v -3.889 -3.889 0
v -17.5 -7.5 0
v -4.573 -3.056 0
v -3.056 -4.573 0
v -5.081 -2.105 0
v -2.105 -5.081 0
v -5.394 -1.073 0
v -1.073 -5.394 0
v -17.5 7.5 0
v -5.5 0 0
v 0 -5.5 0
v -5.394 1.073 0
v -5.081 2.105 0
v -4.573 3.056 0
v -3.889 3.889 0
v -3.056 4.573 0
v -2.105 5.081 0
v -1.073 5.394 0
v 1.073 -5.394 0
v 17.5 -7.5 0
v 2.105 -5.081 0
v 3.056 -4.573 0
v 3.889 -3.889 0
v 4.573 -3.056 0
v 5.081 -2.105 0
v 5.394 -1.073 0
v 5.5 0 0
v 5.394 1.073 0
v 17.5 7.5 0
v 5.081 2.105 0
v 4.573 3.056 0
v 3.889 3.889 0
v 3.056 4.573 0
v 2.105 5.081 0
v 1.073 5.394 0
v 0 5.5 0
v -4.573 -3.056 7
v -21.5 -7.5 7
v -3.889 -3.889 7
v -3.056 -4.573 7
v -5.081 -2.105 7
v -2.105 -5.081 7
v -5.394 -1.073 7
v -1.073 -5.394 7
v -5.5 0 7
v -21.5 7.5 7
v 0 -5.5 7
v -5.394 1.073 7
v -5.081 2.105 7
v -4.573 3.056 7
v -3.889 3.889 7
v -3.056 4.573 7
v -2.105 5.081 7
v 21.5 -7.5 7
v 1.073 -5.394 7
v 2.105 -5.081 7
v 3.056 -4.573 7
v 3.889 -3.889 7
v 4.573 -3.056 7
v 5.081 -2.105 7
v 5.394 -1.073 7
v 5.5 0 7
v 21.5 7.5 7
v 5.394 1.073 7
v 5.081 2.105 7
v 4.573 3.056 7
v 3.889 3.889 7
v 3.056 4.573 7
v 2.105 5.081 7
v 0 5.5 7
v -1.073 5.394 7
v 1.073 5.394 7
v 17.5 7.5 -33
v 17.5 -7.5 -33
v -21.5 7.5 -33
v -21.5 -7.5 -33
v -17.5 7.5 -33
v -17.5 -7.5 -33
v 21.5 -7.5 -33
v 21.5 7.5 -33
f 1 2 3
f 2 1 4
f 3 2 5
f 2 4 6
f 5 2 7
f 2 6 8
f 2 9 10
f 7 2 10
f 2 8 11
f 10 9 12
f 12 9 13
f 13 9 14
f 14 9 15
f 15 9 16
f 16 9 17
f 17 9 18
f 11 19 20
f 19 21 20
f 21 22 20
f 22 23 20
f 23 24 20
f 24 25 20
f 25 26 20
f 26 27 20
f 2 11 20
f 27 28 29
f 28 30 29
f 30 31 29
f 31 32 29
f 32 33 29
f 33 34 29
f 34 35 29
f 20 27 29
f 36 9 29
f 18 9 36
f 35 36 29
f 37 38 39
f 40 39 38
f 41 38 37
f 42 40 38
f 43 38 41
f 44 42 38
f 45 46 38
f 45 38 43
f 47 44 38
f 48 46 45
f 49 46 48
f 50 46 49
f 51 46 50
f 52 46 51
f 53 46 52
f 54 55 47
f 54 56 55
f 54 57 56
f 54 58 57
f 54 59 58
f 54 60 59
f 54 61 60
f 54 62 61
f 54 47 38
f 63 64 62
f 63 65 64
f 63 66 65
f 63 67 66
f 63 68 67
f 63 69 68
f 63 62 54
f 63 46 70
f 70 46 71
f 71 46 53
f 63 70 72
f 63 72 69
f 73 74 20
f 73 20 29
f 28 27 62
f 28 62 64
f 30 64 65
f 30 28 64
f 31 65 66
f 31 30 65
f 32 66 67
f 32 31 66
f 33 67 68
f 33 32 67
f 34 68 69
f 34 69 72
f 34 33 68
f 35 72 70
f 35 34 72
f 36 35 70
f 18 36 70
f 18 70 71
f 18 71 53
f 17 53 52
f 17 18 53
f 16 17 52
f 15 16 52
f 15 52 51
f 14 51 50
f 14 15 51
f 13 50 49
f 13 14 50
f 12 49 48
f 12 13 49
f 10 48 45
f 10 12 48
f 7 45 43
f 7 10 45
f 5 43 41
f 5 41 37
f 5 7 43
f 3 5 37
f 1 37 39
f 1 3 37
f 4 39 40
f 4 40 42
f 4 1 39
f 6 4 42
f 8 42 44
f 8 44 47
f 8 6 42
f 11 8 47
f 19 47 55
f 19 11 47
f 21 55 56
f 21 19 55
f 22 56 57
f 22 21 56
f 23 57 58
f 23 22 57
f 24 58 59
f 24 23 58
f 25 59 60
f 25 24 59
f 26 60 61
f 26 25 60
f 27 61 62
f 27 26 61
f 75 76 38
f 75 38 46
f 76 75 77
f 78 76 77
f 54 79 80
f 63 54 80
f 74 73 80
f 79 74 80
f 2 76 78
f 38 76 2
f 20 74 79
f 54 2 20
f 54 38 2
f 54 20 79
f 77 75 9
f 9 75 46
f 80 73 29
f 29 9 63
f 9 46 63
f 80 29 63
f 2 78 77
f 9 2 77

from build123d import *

# Parameters (mm, degrees)
SKETCH1_W           = 35
SKETCH1_H           = 15
SKETCH1_R           = 5.5
BOSS_EXTRUDE1_DEPTH = 7
SKETCH2_W           = 4
SKETCH2_H           = 15
BOSS_EXTRUDE2_DEPTH = 40


with BuildPart() as part:
    # Sketch1 → Boss-Extrude1 (new body)
    with BuildSketch(Plane.XY):
        Rectangle(SKETCH1_W, SKETCH1_H)
        Circle(SKETCH1_R, mode=Mode.SUBTRACT)
    extrude(amount=BOSS_EXTRUDE1_DEPTH)

    # Sketch2 → Boss-Extrude2 (add)
    with BuildSketch(Plane.XY.offset(7)):
        with Locations((19.5, 0)):
            Rectangle(SKETCH2_W, SKETCH2_H)
        with Locations((-19.5, 0)):
            Rectangle(SKETCH2_W, SKETCH2_H)
    extrude(amount=-BOSS_EXTRUDE2_DEPTH)


solid = part.part
